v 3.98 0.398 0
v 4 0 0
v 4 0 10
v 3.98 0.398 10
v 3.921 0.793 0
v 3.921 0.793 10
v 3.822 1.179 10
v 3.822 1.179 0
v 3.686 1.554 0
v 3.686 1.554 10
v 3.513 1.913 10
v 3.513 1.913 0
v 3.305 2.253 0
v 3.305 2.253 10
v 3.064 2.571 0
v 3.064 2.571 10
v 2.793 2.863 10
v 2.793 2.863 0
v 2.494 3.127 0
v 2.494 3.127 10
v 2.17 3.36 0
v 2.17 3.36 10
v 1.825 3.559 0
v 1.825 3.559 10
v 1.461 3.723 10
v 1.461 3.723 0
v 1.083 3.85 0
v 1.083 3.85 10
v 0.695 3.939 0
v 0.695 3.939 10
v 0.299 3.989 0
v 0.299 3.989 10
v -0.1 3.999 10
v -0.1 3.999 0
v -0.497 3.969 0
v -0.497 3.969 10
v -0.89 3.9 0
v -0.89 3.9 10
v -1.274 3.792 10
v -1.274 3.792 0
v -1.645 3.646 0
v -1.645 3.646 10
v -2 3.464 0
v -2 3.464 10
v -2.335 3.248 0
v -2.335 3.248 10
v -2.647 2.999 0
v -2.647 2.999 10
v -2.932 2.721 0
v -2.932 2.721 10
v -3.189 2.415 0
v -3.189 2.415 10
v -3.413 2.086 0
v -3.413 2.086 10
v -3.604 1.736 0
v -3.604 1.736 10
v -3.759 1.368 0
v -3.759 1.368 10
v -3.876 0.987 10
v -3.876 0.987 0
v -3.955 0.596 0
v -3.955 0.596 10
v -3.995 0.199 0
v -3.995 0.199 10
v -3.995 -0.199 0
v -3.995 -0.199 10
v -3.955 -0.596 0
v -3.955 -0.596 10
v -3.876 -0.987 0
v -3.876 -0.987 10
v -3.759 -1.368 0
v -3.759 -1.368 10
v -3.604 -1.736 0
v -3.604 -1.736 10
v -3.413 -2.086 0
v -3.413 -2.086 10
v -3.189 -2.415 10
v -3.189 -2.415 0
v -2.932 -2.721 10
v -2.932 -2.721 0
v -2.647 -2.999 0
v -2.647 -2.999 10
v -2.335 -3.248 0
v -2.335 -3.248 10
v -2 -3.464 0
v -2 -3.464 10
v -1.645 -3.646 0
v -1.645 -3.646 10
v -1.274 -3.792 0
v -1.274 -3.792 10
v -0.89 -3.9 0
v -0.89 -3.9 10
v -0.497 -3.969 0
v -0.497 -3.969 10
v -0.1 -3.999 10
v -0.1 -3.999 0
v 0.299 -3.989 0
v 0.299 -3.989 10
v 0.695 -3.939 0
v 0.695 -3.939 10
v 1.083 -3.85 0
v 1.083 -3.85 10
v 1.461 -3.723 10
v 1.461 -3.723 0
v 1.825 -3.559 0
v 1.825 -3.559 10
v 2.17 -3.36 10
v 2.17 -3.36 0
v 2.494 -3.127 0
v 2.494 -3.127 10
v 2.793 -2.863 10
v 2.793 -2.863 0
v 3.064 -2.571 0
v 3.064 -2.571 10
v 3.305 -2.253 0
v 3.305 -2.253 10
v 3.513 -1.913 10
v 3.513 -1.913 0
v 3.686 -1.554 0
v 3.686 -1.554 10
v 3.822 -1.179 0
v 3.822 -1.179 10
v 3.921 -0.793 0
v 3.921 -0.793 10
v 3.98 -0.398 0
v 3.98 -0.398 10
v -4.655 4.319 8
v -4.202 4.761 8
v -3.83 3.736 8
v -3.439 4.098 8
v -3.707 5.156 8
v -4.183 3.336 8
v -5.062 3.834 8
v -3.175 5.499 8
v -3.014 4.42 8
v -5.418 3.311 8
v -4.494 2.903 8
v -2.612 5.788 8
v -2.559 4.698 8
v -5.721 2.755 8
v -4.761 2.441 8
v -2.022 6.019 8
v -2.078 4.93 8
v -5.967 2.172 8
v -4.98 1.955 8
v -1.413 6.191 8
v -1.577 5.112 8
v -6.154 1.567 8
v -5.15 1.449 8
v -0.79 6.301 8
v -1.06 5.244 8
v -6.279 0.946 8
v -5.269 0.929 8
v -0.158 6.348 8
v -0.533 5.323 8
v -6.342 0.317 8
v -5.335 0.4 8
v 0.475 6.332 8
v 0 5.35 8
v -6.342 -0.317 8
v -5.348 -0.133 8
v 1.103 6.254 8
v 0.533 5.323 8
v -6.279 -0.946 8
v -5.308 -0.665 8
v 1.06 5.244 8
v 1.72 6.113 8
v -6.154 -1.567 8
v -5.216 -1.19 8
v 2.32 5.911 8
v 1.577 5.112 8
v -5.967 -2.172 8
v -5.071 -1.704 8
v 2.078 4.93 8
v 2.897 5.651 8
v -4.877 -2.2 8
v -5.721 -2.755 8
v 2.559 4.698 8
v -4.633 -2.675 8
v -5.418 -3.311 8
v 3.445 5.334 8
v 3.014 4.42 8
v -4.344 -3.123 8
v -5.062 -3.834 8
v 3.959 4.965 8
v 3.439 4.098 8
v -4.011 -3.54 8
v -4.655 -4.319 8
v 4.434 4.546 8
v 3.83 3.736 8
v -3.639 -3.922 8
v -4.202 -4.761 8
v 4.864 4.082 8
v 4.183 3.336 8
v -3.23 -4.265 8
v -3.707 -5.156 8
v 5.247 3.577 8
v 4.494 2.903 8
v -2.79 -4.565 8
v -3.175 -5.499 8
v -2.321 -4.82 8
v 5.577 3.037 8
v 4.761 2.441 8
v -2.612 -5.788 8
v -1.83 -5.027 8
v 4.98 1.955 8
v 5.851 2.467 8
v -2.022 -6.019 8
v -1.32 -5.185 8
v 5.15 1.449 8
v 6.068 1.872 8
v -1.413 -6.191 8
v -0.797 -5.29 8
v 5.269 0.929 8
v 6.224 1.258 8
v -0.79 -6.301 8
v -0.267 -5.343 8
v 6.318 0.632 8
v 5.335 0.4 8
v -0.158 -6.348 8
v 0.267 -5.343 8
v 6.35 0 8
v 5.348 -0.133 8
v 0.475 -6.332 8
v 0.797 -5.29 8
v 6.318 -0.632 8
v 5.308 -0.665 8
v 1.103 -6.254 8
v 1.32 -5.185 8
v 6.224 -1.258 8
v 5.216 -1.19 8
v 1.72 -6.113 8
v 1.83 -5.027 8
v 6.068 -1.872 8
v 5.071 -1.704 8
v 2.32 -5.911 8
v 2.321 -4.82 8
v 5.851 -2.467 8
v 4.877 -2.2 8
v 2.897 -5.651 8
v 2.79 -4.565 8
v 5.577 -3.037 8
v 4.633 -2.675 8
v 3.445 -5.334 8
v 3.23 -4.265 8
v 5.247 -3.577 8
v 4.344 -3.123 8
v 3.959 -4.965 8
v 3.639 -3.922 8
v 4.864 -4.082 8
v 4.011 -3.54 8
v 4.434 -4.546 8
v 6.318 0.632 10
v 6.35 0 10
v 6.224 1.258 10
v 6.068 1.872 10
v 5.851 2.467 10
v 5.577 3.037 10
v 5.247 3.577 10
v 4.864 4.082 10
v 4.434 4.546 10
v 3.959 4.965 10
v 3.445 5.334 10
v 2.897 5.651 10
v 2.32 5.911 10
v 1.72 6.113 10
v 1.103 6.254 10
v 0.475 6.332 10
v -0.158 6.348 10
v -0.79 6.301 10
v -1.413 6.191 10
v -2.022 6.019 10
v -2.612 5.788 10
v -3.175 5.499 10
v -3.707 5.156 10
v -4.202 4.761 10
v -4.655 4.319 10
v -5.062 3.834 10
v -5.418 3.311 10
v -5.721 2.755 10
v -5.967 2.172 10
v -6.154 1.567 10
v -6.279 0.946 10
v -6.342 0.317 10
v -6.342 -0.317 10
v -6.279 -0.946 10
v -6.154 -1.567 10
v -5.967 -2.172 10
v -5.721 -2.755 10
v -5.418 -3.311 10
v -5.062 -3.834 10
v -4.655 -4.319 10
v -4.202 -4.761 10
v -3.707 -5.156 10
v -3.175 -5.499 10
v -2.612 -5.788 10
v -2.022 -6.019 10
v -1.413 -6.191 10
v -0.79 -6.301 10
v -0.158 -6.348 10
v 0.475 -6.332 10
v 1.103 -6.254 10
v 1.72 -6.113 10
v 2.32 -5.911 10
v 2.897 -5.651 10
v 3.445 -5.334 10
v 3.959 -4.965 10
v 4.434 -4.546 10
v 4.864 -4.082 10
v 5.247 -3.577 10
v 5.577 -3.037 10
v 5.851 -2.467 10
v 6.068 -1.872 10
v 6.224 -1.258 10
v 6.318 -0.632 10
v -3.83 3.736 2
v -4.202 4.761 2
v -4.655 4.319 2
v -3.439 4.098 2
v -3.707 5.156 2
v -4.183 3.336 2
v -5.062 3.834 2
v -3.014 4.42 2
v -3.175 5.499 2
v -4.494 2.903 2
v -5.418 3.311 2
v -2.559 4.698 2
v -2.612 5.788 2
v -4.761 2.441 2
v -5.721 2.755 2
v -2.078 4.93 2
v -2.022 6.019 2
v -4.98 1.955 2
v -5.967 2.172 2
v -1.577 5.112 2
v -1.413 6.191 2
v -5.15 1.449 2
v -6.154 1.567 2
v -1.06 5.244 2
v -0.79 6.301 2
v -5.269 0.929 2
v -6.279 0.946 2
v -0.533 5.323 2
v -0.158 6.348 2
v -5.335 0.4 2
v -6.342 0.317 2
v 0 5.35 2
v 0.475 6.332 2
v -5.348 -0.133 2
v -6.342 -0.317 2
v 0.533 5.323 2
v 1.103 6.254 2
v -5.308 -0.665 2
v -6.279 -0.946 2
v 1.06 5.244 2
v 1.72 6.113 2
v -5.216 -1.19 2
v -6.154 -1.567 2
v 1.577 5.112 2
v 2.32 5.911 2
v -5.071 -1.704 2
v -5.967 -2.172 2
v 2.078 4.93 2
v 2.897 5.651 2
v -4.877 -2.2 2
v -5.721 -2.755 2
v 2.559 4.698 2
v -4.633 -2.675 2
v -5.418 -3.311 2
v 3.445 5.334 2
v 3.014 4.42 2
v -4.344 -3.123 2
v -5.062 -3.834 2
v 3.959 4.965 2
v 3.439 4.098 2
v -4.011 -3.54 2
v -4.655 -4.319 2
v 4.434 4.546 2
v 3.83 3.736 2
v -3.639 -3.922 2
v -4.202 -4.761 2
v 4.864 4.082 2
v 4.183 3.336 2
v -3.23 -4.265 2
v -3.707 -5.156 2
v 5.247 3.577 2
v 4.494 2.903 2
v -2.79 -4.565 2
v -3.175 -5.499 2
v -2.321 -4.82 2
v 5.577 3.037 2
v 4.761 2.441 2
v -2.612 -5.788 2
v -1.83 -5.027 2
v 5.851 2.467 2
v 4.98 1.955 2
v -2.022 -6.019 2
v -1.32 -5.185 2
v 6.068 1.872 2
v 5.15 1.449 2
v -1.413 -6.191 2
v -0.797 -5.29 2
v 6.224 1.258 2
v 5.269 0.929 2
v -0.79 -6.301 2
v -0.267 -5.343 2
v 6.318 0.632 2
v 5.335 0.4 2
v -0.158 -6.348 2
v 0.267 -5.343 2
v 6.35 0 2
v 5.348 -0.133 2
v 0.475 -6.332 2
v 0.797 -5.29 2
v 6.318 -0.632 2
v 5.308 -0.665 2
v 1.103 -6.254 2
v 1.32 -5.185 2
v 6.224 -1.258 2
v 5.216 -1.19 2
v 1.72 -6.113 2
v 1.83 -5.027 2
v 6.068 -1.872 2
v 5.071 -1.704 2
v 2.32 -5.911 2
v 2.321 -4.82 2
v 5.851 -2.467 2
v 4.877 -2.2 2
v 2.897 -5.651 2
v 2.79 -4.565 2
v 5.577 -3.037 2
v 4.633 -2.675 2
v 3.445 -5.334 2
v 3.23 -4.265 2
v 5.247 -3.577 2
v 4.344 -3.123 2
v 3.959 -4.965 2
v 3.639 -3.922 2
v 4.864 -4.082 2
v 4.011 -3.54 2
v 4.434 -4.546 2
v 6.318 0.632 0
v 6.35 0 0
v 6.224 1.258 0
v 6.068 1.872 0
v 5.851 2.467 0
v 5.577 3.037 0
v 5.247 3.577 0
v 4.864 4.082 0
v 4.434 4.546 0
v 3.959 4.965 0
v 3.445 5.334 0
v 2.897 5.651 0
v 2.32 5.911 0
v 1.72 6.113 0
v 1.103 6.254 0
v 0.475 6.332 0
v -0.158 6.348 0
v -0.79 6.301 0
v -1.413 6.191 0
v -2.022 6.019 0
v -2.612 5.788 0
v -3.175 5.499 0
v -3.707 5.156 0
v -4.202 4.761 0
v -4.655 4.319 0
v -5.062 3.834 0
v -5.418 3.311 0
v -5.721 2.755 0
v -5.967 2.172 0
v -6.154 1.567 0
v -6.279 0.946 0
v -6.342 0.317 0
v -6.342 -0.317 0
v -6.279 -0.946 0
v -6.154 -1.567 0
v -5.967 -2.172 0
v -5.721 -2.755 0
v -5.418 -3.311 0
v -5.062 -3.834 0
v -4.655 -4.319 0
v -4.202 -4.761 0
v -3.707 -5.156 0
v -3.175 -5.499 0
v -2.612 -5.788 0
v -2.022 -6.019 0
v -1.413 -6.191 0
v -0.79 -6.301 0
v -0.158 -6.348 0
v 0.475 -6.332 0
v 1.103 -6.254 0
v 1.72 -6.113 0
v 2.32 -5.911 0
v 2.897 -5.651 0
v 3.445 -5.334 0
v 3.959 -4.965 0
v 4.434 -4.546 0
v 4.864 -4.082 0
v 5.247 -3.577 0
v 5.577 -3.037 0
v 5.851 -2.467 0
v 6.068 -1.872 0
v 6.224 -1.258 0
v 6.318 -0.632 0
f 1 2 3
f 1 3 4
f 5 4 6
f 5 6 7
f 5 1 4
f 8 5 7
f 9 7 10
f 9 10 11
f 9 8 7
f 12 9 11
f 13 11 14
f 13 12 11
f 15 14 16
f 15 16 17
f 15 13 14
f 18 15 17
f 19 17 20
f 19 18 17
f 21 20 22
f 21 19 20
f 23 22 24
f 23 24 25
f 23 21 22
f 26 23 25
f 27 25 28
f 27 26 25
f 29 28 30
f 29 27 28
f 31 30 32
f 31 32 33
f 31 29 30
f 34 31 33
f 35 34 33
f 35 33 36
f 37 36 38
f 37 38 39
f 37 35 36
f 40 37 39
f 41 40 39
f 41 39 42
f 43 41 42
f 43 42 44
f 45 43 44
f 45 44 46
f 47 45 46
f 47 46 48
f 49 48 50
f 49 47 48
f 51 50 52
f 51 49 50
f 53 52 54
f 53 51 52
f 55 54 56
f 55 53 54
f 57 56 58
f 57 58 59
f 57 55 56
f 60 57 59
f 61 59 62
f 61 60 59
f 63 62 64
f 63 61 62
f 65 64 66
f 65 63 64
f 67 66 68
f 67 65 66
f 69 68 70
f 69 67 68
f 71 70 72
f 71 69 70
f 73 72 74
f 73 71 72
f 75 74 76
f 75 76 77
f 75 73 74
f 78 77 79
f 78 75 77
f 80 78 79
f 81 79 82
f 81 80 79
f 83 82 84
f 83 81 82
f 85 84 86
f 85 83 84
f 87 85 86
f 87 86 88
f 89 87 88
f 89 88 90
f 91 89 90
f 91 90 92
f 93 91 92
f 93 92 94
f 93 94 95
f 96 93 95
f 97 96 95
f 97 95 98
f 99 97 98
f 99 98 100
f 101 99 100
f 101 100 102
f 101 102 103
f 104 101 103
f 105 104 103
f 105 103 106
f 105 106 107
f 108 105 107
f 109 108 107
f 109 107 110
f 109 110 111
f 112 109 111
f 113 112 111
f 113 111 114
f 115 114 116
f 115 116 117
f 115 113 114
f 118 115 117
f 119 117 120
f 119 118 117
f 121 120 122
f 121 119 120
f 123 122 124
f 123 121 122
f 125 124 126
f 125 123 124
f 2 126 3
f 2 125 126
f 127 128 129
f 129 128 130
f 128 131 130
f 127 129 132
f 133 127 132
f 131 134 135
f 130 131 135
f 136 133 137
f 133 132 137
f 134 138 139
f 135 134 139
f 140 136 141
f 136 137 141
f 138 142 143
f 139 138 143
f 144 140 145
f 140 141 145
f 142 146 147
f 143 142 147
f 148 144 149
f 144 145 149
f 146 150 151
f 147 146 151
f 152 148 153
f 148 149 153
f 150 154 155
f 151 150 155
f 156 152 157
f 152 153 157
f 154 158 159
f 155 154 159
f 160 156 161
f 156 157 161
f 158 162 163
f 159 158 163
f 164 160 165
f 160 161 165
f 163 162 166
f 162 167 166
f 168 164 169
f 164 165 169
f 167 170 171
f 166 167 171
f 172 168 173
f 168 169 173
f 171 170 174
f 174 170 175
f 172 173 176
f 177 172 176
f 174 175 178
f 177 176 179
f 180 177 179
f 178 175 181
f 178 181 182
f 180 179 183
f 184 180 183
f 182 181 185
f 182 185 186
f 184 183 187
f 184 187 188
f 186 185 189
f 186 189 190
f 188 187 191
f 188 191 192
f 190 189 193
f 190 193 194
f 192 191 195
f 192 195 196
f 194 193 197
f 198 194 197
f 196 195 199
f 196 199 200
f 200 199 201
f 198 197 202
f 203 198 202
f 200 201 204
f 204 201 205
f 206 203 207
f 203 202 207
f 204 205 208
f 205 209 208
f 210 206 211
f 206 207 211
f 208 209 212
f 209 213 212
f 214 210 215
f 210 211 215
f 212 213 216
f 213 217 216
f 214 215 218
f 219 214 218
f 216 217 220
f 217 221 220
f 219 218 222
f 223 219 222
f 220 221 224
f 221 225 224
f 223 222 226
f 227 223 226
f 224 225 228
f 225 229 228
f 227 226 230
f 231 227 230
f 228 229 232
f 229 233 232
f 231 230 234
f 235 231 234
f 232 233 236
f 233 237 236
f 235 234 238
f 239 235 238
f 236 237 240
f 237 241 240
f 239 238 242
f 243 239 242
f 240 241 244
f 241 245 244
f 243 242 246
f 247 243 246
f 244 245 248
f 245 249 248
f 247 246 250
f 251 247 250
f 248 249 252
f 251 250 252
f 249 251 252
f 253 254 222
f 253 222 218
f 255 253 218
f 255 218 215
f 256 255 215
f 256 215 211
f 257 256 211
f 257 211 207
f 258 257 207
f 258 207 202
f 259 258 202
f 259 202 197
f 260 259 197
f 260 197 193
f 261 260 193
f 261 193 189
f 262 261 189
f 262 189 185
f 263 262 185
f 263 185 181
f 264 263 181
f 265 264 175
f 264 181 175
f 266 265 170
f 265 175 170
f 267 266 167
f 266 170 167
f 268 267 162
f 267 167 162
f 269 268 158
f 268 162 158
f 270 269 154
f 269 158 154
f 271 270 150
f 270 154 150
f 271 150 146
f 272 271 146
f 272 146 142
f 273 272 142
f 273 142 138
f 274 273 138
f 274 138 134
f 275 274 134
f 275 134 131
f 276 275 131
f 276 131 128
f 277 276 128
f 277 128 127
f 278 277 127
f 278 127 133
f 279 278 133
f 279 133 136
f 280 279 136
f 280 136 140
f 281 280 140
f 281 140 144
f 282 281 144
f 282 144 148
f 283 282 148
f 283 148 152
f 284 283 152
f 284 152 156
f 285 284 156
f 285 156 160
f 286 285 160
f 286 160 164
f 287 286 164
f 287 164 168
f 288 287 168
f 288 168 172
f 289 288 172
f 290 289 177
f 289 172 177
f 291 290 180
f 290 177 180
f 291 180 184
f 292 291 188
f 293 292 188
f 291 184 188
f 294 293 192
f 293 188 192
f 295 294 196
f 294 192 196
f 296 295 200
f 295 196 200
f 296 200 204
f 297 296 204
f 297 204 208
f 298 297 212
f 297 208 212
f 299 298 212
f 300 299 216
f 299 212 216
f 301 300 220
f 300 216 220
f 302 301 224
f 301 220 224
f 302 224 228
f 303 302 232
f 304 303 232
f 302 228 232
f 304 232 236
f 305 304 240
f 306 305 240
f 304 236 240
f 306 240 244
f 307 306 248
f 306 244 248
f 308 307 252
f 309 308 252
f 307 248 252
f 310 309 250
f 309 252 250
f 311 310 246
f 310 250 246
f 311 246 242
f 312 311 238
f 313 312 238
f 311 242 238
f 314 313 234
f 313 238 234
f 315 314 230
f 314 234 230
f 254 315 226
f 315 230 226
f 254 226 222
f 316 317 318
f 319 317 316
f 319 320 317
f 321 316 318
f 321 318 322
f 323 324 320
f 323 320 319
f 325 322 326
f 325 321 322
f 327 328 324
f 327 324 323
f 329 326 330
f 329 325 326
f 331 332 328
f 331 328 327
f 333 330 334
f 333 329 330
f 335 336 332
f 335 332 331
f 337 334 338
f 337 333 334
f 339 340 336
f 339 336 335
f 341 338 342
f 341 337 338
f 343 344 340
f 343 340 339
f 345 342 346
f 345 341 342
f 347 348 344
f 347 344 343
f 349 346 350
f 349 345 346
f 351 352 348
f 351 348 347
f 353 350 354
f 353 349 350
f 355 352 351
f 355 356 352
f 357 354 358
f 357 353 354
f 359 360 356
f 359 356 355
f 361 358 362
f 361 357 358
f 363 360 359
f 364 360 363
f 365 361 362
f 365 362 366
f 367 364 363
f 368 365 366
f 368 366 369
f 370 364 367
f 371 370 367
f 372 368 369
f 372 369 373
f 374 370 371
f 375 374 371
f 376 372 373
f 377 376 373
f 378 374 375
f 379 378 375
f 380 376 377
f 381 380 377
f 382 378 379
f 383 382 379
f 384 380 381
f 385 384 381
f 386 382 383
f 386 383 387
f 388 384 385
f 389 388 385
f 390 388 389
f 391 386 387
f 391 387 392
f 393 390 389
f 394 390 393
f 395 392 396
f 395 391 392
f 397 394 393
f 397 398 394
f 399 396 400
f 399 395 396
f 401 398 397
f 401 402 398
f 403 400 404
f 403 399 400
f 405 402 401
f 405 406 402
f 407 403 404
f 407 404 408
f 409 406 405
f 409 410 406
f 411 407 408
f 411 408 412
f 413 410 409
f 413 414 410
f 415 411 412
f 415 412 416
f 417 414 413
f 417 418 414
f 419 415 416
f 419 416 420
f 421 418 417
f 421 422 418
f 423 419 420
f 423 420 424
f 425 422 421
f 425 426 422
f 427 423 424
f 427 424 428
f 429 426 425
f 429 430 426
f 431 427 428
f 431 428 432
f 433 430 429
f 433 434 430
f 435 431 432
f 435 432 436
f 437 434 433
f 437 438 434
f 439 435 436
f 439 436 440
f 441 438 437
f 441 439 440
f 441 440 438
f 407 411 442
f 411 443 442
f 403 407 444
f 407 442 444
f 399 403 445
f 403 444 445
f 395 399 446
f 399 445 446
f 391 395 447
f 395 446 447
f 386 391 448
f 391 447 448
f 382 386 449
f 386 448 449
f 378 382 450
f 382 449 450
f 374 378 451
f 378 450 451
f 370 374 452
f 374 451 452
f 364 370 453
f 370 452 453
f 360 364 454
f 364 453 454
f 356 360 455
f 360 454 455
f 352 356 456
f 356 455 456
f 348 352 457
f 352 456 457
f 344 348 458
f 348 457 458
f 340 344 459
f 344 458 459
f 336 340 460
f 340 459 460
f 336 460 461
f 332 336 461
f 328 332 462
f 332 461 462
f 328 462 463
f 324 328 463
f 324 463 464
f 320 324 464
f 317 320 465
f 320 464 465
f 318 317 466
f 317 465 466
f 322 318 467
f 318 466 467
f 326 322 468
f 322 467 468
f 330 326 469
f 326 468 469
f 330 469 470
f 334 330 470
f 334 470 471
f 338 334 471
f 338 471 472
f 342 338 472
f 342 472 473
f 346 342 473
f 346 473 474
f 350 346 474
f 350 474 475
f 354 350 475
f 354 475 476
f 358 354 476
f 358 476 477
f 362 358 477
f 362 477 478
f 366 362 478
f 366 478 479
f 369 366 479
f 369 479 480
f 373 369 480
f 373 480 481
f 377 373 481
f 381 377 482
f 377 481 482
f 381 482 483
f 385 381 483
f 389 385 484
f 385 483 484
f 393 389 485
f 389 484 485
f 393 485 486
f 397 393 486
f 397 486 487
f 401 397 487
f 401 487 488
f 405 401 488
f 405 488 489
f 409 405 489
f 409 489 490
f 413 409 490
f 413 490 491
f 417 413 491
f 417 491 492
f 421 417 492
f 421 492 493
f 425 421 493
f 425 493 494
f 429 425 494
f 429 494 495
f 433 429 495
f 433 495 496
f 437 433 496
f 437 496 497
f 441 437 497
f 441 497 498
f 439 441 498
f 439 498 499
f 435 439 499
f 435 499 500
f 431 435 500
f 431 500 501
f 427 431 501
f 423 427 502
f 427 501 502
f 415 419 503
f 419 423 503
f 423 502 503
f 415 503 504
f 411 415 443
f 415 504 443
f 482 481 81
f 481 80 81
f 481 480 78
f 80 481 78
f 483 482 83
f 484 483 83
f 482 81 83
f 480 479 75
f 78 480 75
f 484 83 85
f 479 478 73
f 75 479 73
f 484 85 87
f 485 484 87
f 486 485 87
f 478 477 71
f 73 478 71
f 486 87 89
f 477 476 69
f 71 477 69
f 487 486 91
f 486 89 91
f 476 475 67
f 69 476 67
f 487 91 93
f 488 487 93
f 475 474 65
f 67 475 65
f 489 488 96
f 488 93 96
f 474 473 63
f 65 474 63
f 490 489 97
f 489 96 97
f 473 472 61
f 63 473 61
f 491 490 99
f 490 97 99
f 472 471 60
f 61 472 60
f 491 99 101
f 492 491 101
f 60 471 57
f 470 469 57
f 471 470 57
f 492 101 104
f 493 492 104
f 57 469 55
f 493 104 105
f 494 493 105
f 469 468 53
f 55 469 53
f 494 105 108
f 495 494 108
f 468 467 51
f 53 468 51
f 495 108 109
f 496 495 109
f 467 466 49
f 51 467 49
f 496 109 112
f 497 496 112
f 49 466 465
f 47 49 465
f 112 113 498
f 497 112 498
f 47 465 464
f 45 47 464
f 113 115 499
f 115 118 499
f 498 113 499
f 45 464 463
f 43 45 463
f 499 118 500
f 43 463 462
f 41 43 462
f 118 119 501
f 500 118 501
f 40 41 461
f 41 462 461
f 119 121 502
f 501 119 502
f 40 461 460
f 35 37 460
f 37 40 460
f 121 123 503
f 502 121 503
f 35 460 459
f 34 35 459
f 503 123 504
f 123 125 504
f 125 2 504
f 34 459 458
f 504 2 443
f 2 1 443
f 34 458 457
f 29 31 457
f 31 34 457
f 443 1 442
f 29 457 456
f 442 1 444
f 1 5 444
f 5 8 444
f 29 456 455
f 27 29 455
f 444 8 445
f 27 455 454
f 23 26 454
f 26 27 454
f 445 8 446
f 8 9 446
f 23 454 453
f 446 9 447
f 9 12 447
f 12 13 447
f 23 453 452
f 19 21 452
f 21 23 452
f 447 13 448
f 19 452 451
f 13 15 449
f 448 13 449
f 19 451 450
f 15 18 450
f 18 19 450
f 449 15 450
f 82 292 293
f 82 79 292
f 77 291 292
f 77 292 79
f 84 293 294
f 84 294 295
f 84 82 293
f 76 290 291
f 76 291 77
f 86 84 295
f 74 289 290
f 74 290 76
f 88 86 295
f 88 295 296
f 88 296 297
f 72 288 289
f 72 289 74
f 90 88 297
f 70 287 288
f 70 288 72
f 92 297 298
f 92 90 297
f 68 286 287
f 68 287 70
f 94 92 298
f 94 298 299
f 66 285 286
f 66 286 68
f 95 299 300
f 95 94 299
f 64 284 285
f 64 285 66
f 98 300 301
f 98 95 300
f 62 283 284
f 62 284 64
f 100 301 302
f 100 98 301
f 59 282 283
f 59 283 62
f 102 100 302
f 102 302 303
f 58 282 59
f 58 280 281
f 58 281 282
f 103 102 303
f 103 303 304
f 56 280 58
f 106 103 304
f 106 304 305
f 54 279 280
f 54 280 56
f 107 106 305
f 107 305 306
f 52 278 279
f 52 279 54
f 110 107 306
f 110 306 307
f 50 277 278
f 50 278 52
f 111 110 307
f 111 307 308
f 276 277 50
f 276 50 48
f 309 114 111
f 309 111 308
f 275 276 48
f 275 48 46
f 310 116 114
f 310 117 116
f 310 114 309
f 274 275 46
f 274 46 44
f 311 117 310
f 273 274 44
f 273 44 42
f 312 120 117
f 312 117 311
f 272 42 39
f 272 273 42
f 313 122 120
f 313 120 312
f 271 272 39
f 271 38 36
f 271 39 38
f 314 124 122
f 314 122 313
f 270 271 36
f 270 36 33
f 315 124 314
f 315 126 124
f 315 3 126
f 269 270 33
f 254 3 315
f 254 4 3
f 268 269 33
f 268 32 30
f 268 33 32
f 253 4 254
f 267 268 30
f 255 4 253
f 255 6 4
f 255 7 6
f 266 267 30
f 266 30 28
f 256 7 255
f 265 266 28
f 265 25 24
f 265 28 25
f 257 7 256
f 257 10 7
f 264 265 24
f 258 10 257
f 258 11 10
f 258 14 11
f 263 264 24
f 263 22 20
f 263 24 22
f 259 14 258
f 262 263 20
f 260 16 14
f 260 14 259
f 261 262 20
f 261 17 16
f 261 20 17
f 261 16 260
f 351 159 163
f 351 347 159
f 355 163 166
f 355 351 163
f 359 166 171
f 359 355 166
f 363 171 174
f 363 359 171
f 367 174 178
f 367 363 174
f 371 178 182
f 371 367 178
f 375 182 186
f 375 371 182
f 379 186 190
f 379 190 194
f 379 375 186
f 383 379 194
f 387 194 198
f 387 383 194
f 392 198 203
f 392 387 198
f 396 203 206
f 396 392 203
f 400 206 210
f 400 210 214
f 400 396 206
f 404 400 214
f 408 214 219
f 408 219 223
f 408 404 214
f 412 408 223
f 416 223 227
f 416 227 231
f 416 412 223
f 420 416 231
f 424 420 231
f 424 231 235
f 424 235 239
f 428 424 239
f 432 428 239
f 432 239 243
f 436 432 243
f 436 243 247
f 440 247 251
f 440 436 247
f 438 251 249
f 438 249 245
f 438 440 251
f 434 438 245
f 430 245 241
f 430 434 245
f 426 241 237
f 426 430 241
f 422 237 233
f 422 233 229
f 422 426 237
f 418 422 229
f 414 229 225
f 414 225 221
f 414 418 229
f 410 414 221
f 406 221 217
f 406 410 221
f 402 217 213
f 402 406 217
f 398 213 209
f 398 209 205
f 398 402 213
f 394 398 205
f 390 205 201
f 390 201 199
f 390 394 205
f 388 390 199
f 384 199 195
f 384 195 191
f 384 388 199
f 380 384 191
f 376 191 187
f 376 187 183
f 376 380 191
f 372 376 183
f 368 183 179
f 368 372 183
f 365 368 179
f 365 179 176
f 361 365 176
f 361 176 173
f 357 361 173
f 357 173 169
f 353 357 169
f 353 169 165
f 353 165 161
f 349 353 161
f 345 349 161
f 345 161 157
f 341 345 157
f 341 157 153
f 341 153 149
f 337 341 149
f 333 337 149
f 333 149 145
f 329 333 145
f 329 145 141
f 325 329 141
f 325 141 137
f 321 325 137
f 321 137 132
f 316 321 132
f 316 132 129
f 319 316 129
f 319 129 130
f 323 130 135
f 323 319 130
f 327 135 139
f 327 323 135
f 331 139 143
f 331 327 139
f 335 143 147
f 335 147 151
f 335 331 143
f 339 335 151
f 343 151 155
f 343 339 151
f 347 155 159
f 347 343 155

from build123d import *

# Parameters (mm, degrees)
CROQUIS1_R              = 6.35
CROQUIS1_R_2            = 4
SALIENTE_EXTRUIR1_DEPTH = 10
CROQUIS2_W              = 6
CROQUIS2_H              = 1


with BuildPart() as part:
    # Croquis1 → Saliente-Extruir1 (new body)
    with BuildSketch(Plane.XY):
        Circle(CROQUIS1_R)
        Circle(CROQUIS1_R_2, mode=Mode.SUBTRACT)
    extrude(amount=SALIENTE_EXTRUIR1_DEPTH)

    # Croquis2 → Cortar-Revolución1 (revolve, cut)
    with BuildSketch(Plane(origin=(0, 0, 0), x_dir=(0, 0, -1), z_dir=(1, 0, 0))):
        with Locations((-5, 5.85)):
            Rectangle(CROQUIS2_W, CROQUIS2_H)
    revolve(axis=Axis((0, 0, 10), (0, 0, -1)), mode=Mode.SUBTRACT)


solid = part.part
